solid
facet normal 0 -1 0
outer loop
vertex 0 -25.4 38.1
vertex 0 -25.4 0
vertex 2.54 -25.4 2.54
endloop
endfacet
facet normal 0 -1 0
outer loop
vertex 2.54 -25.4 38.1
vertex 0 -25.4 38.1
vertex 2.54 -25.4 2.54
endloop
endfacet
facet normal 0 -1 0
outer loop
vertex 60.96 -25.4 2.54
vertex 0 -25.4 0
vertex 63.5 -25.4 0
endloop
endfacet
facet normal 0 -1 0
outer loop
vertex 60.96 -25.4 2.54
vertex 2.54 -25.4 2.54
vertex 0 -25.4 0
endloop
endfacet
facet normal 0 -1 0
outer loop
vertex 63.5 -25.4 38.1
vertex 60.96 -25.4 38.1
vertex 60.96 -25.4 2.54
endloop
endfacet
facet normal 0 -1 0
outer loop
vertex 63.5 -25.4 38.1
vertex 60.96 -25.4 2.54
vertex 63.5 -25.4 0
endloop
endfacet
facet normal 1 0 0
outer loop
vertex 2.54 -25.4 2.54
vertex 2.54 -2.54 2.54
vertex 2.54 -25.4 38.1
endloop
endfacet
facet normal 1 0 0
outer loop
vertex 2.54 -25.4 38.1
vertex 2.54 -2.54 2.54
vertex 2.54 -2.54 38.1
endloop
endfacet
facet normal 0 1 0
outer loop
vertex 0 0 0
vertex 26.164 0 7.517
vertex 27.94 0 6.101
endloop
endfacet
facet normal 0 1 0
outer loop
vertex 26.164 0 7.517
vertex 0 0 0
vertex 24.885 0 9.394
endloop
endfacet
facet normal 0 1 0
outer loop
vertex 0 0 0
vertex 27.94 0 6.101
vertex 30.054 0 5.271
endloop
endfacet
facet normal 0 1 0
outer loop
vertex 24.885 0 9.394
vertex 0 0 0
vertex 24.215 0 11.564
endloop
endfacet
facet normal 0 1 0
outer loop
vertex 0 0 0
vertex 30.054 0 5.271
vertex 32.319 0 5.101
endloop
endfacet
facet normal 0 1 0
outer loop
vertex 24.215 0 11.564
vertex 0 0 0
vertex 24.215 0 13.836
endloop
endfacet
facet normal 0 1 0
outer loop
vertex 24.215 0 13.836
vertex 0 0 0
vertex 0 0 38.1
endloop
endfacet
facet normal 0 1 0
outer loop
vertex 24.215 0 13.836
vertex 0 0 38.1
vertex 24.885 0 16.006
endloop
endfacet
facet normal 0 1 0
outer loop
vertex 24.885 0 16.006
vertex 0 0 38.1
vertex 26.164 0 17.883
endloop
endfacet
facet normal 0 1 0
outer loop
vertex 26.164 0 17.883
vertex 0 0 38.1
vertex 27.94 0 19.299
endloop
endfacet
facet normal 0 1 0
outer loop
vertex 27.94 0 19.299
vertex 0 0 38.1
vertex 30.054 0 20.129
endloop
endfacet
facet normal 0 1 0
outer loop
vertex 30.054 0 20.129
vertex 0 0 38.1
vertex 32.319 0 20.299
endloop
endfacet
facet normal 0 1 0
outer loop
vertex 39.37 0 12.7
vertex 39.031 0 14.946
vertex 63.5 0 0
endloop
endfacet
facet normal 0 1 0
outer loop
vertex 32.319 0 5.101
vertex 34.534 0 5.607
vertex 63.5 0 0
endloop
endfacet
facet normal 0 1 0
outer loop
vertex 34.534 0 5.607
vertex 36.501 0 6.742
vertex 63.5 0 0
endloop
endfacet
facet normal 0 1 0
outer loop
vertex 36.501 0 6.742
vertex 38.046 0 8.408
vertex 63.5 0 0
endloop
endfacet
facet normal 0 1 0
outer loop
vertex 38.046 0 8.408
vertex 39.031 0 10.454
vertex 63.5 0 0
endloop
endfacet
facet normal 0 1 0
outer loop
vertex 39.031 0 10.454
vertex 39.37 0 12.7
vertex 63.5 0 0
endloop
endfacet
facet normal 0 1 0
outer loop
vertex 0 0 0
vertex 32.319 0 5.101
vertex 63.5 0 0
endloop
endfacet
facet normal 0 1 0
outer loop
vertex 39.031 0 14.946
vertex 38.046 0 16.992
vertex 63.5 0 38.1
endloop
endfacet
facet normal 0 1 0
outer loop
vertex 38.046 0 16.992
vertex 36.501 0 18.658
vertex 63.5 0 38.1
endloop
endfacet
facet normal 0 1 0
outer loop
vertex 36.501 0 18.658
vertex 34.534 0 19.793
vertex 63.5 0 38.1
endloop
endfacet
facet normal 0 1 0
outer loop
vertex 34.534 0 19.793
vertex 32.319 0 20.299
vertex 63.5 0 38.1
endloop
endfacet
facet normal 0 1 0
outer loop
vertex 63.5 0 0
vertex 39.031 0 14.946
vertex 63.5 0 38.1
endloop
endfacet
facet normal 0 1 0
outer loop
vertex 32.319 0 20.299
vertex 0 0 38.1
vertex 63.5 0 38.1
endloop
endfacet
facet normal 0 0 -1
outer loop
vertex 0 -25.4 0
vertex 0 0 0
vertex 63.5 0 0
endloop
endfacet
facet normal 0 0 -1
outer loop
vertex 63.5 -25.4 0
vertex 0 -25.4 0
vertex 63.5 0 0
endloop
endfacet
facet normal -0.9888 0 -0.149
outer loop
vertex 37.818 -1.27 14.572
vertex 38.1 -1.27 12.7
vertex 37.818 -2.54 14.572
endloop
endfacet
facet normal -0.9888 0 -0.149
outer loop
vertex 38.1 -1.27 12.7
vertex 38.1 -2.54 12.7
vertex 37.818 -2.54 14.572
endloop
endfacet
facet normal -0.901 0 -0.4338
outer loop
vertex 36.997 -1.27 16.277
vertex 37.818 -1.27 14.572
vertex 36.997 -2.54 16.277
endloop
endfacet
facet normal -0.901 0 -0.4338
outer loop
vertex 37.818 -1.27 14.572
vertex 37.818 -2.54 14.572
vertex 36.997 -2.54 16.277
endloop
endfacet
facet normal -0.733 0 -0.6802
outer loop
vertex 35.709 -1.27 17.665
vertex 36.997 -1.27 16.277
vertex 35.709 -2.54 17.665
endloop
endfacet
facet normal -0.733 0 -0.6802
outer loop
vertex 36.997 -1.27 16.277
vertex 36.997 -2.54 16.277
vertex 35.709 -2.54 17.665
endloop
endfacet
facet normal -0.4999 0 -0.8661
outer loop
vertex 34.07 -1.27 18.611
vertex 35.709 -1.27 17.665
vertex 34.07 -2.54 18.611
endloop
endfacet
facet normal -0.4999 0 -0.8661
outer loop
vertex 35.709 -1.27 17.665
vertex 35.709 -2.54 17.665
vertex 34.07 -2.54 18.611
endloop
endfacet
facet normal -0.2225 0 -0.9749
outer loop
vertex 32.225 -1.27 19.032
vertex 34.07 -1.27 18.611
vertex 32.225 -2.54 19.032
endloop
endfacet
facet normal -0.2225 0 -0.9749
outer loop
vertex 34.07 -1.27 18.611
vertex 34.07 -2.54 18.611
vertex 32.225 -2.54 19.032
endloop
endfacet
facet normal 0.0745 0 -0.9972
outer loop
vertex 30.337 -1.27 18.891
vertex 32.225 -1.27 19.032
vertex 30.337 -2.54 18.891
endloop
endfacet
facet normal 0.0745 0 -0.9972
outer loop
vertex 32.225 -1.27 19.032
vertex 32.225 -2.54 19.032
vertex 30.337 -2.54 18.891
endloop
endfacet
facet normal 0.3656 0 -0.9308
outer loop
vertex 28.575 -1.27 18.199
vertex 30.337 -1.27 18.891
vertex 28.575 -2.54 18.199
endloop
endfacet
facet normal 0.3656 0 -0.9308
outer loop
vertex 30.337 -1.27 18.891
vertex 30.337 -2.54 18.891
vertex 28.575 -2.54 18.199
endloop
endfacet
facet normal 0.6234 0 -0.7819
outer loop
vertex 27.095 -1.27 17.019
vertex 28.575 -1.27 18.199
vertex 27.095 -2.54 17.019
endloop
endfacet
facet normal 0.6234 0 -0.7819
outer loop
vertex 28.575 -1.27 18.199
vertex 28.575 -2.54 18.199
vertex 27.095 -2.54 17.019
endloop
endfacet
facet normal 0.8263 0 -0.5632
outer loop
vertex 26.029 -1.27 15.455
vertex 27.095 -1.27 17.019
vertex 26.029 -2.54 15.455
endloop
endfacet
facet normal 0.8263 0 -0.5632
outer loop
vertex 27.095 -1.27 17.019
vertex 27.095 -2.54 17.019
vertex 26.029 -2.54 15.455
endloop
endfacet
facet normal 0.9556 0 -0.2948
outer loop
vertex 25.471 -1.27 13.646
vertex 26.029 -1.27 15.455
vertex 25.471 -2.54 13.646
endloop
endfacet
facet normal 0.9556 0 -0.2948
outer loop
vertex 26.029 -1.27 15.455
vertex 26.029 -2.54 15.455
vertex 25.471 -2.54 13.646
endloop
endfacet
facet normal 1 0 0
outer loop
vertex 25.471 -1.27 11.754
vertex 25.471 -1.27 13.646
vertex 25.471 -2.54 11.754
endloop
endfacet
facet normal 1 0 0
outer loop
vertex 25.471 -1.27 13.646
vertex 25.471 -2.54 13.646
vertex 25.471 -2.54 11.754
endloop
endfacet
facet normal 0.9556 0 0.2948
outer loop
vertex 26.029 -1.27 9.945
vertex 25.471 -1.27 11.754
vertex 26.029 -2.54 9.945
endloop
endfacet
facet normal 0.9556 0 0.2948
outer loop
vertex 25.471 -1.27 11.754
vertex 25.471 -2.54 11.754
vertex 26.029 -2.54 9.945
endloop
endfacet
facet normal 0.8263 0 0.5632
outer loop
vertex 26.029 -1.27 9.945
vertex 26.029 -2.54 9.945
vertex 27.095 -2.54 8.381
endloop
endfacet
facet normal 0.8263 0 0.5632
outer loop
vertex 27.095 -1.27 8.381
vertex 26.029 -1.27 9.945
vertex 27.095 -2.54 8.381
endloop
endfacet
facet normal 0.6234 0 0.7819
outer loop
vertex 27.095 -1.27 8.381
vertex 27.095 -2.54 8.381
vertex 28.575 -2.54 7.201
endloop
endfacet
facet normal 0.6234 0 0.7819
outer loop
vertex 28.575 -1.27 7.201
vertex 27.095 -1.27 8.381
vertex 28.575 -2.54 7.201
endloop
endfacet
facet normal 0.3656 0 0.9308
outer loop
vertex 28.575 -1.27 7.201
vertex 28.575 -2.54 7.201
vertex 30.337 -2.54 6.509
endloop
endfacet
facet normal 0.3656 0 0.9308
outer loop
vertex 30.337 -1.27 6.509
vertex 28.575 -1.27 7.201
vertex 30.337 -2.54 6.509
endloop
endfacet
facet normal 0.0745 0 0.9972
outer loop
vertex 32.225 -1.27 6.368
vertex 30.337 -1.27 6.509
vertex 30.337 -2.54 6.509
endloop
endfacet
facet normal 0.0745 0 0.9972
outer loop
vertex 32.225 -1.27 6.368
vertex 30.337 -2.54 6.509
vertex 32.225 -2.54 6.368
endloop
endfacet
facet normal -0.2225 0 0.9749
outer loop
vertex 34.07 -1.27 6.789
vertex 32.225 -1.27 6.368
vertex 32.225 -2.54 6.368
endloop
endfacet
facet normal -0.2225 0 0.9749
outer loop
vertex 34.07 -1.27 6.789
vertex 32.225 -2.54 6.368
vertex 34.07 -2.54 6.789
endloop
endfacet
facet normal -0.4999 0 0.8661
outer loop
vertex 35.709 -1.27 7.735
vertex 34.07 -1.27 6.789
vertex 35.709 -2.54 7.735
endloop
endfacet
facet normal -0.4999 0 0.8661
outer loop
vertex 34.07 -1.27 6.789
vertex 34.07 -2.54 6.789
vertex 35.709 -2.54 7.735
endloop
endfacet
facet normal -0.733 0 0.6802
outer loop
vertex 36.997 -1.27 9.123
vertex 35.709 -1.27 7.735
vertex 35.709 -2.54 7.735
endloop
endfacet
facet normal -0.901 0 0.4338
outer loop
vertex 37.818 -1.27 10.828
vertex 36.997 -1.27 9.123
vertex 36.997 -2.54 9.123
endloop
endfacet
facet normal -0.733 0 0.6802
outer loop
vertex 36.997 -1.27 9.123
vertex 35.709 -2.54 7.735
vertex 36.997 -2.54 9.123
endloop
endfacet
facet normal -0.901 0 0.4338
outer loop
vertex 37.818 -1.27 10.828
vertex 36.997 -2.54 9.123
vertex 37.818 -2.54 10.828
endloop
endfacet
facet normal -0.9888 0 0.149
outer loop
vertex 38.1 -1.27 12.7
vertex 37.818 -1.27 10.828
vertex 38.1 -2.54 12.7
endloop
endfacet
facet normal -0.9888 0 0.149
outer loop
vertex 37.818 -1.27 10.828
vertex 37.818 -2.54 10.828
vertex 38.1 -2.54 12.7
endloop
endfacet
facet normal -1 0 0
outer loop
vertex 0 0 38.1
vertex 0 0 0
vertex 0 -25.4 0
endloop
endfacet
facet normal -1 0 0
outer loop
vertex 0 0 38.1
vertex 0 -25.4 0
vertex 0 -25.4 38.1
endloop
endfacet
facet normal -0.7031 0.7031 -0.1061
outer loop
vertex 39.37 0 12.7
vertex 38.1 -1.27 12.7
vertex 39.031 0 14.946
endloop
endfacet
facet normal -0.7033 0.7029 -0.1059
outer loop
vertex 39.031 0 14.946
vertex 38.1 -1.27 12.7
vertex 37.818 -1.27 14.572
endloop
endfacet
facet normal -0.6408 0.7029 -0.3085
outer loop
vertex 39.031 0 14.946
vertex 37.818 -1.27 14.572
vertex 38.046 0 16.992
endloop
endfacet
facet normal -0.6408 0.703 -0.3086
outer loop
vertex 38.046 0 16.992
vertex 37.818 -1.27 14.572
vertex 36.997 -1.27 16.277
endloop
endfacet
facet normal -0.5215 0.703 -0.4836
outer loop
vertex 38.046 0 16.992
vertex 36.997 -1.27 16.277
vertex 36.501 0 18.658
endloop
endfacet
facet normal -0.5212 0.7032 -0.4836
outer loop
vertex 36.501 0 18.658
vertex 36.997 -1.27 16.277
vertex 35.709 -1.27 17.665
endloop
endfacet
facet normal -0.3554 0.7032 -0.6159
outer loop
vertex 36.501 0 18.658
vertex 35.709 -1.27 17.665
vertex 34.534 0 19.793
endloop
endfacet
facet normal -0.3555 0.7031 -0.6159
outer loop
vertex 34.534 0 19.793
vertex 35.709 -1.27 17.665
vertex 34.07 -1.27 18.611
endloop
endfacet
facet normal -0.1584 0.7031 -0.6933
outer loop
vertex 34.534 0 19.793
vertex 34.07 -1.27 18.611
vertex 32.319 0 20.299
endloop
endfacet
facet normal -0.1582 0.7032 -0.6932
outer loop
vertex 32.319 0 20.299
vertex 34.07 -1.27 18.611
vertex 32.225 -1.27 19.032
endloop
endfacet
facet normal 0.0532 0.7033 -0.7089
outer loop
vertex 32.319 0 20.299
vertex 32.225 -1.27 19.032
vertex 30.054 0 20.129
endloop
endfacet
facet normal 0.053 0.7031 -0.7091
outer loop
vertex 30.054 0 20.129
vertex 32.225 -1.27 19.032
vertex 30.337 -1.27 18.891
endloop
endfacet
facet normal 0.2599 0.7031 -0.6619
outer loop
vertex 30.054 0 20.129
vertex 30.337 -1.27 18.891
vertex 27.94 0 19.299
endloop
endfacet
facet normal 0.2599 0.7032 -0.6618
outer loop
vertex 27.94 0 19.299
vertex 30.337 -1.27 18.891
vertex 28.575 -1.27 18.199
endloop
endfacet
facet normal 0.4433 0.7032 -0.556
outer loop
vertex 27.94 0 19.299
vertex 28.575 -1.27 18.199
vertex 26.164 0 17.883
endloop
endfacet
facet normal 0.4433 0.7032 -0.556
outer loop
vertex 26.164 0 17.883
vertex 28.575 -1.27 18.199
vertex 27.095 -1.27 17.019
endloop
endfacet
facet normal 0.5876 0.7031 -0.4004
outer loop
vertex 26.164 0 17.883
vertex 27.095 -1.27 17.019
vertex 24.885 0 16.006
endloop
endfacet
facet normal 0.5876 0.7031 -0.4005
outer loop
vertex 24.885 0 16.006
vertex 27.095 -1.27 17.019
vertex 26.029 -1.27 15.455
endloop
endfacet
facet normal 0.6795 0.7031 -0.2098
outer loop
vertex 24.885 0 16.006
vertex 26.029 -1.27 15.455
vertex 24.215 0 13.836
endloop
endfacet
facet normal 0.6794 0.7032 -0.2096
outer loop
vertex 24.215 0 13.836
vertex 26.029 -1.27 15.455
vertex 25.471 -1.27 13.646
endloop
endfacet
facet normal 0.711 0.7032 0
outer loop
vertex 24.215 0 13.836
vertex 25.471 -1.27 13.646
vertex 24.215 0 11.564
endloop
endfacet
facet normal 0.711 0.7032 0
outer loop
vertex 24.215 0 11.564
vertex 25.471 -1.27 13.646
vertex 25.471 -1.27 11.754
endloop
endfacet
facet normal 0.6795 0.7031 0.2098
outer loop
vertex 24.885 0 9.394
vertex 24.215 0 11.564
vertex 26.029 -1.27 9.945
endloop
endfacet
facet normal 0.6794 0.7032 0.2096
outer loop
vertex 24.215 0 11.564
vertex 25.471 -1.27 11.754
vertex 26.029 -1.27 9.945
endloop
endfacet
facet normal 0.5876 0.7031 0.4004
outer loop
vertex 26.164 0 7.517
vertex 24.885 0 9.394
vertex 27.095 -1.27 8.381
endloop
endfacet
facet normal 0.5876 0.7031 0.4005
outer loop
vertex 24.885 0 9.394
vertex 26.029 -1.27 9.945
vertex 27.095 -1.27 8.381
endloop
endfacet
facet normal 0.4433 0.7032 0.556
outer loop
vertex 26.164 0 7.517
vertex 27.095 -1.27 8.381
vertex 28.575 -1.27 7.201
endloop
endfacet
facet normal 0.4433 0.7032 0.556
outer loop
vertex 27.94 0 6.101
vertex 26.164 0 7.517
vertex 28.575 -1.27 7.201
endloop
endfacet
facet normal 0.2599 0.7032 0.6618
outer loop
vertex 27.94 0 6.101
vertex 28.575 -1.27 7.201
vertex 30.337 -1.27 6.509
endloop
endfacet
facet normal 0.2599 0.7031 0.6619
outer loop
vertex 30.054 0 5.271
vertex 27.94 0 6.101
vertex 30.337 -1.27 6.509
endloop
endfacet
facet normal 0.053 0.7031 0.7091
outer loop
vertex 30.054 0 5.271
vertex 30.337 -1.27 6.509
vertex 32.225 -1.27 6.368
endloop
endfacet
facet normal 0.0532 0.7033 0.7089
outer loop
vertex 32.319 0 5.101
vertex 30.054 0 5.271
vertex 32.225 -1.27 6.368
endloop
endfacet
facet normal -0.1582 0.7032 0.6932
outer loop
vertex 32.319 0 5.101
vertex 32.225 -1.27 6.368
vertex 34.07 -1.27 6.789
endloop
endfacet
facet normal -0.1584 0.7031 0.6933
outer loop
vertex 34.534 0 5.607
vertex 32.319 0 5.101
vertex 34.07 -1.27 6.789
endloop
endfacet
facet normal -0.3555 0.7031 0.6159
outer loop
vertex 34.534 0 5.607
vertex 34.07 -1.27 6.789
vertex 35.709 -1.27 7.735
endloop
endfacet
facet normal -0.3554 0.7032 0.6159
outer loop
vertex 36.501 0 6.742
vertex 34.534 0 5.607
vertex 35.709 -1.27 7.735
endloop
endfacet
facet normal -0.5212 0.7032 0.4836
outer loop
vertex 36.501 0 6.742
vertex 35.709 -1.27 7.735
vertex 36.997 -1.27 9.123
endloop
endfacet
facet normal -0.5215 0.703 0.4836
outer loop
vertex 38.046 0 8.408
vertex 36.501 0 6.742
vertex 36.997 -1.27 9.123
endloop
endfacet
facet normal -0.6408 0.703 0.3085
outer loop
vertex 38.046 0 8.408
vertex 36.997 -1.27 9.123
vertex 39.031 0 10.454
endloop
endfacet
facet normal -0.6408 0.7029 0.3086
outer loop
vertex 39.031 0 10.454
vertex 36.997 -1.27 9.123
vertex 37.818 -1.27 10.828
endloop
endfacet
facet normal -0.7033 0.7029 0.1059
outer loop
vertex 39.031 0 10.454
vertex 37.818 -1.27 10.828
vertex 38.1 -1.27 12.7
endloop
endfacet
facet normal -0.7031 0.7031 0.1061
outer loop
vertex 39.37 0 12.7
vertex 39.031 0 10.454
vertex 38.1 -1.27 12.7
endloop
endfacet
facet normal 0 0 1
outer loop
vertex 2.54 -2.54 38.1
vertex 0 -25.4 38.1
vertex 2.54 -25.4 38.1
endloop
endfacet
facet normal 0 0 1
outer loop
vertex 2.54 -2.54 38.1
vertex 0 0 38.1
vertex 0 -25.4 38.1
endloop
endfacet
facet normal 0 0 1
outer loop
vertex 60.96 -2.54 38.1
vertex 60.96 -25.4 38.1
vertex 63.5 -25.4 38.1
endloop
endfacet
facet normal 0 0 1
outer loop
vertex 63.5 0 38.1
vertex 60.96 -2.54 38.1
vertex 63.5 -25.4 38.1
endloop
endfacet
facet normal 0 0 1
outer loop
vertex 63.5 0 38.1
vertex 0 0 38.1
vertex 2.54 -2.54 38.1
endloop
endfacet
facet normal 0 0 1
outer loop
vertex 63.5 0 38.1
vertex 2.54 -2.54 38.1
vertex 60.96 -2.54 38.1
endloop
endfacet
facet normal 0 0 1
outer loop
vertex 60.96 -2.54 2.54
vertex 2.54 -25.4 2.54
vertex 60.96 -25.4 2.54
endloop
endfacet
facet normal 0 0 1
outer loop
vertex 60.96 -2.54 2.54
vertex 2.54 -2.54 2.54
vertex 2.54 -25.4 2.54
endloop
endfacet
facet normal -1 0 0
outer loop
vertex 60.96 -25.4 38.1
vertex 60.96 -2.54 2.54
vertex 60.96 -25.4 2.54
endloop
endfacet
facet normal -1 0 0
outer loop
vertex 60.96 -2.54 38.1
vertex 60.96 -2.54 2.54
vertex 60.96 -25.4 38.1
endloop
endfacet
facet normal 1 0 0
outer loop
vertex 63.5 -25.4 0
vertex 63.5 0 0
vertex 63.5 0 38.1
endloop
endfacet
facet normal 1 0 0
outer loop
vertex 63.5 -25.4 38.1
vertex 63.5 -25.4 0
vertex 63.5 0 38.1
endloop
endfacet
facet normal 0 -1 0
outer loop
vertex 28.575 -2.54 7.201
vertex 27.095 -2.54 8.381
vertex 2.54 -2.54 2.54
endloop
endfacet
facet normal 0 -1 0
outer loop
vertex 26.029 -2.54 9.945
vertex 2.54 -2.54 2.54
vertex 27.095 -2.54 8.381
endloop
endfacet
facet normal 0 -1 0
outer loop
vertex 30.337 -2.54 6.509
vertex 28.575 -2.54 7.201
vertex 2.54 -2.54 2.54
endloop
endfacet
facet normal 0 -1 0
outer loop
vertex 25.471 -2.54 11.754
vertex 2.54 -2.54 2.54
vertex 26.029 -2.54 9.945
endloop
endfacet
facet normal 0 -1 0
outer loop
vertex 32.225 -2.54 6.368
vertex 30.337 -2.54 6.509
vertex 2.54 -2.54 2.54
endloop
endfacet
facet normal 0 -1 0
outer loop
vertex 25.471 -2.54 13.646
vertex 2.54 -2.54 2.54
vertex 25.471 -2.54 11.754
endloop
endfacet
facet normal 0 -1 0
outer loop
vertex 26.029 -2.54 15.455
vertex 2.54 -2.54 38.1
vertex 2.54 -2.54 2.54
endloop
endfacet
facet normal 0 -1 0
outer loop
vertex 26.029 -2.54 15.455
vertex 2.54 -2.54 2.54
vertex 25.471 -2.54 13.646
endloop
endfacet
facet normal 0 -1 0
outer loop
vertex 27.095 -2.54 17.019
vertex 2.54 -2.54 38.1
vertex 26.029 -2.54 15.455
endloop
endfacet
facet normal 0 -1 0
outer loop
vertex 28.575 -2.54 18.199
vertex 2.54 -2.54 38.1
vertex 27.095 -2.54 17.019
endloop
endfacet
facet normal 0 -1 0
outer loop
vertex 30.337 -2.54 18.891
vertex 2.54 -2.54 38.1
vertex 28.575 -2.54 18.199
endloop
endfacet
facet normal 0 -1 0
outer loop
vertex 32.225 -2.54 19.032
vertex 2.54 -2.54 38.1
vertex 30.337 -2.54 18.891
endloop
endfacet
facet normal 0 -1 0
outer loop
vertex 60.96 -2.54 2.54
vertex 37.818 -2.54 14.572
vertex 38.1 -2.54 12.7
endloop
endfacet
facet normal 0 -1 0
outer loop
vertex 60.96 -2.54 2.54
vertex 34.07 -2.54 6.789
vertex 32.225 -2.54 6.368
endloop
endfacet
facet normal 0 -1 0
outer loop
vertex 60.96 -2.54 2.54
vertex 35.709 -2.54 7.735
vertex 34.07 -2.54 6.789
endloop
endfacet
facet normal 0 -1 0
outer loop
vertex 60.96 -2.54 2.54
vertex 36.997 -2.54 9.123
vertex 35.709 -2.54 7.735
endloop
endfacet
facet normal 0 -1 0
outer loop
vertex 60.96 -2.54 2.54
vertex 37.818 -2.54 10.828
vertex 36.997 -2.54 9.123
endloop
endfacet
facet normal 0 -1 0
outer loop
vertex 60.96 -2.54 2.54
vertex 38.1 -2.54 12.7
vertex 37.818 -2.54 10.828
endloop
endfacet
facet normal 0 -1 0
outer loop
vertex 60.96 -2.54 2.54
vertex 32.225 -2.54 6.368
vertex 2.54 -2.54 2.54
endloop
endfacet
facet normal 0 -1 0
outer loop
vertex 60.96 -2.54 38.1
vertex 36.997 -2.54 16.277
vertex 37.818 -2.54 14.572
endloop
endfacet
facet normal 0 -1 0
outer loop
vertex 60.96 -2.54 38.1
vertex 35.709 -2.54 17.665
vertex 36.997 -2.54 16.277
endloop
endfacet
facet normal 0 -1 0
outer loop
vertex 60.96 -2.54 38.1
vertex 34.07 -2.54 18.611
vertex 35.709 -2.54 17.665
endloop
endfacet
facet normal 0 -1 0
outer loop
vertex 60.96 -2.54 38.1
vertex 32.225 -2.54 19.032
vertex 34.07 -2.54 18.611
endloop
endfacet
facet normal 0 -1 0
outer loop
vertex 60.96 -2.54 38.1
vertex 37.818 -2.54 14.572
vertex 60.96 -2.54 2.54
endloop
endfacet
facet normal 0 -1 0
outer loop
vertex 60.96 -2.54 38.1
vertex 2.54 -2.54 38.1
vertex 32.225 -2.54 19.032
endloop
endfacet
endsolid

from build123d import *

# Parameters (mm, degrees)
F0_W           = 63.5
F0_H           = 38.1
F1_DEPTH       = 25.4
F2_T           = -2.54
F4_D           = 12.7
F4_CSINK_D     = 15.24
F4_CSINK_ANGLE = 90


with BuildPart() as f1:
    # F0 (on Front) → F1 (new body)
    with BuildSketch(Plane.XZ):
        with Locations((31.75, 19.05)):
            Rectangle(F0_W, F0_H)
    extrude(amount=F1_DEPTH)

    # F2
    f2_openings = [f1.faces().sort_by_distance(p)[0] for p in [
        (31.75, -25.4, 19.05),
        (31.75, -12.7, 38.1),
    ]]
    offset(amount=F2_T, openings=f2_openings)

    # F4 (through all)
    with Locations(Plane(origin=(0, 0, 0), x_dir=(-1, 0, 0), z_dir=(0, 1, 0))):
        with Locations((-31.75, 12.7)):
            CounterSinkHole(F4_D / 2, F4_CSINK_D / 2, counter_sink_angle=F4_CSINK_ANGLE)


solid = f1.part
